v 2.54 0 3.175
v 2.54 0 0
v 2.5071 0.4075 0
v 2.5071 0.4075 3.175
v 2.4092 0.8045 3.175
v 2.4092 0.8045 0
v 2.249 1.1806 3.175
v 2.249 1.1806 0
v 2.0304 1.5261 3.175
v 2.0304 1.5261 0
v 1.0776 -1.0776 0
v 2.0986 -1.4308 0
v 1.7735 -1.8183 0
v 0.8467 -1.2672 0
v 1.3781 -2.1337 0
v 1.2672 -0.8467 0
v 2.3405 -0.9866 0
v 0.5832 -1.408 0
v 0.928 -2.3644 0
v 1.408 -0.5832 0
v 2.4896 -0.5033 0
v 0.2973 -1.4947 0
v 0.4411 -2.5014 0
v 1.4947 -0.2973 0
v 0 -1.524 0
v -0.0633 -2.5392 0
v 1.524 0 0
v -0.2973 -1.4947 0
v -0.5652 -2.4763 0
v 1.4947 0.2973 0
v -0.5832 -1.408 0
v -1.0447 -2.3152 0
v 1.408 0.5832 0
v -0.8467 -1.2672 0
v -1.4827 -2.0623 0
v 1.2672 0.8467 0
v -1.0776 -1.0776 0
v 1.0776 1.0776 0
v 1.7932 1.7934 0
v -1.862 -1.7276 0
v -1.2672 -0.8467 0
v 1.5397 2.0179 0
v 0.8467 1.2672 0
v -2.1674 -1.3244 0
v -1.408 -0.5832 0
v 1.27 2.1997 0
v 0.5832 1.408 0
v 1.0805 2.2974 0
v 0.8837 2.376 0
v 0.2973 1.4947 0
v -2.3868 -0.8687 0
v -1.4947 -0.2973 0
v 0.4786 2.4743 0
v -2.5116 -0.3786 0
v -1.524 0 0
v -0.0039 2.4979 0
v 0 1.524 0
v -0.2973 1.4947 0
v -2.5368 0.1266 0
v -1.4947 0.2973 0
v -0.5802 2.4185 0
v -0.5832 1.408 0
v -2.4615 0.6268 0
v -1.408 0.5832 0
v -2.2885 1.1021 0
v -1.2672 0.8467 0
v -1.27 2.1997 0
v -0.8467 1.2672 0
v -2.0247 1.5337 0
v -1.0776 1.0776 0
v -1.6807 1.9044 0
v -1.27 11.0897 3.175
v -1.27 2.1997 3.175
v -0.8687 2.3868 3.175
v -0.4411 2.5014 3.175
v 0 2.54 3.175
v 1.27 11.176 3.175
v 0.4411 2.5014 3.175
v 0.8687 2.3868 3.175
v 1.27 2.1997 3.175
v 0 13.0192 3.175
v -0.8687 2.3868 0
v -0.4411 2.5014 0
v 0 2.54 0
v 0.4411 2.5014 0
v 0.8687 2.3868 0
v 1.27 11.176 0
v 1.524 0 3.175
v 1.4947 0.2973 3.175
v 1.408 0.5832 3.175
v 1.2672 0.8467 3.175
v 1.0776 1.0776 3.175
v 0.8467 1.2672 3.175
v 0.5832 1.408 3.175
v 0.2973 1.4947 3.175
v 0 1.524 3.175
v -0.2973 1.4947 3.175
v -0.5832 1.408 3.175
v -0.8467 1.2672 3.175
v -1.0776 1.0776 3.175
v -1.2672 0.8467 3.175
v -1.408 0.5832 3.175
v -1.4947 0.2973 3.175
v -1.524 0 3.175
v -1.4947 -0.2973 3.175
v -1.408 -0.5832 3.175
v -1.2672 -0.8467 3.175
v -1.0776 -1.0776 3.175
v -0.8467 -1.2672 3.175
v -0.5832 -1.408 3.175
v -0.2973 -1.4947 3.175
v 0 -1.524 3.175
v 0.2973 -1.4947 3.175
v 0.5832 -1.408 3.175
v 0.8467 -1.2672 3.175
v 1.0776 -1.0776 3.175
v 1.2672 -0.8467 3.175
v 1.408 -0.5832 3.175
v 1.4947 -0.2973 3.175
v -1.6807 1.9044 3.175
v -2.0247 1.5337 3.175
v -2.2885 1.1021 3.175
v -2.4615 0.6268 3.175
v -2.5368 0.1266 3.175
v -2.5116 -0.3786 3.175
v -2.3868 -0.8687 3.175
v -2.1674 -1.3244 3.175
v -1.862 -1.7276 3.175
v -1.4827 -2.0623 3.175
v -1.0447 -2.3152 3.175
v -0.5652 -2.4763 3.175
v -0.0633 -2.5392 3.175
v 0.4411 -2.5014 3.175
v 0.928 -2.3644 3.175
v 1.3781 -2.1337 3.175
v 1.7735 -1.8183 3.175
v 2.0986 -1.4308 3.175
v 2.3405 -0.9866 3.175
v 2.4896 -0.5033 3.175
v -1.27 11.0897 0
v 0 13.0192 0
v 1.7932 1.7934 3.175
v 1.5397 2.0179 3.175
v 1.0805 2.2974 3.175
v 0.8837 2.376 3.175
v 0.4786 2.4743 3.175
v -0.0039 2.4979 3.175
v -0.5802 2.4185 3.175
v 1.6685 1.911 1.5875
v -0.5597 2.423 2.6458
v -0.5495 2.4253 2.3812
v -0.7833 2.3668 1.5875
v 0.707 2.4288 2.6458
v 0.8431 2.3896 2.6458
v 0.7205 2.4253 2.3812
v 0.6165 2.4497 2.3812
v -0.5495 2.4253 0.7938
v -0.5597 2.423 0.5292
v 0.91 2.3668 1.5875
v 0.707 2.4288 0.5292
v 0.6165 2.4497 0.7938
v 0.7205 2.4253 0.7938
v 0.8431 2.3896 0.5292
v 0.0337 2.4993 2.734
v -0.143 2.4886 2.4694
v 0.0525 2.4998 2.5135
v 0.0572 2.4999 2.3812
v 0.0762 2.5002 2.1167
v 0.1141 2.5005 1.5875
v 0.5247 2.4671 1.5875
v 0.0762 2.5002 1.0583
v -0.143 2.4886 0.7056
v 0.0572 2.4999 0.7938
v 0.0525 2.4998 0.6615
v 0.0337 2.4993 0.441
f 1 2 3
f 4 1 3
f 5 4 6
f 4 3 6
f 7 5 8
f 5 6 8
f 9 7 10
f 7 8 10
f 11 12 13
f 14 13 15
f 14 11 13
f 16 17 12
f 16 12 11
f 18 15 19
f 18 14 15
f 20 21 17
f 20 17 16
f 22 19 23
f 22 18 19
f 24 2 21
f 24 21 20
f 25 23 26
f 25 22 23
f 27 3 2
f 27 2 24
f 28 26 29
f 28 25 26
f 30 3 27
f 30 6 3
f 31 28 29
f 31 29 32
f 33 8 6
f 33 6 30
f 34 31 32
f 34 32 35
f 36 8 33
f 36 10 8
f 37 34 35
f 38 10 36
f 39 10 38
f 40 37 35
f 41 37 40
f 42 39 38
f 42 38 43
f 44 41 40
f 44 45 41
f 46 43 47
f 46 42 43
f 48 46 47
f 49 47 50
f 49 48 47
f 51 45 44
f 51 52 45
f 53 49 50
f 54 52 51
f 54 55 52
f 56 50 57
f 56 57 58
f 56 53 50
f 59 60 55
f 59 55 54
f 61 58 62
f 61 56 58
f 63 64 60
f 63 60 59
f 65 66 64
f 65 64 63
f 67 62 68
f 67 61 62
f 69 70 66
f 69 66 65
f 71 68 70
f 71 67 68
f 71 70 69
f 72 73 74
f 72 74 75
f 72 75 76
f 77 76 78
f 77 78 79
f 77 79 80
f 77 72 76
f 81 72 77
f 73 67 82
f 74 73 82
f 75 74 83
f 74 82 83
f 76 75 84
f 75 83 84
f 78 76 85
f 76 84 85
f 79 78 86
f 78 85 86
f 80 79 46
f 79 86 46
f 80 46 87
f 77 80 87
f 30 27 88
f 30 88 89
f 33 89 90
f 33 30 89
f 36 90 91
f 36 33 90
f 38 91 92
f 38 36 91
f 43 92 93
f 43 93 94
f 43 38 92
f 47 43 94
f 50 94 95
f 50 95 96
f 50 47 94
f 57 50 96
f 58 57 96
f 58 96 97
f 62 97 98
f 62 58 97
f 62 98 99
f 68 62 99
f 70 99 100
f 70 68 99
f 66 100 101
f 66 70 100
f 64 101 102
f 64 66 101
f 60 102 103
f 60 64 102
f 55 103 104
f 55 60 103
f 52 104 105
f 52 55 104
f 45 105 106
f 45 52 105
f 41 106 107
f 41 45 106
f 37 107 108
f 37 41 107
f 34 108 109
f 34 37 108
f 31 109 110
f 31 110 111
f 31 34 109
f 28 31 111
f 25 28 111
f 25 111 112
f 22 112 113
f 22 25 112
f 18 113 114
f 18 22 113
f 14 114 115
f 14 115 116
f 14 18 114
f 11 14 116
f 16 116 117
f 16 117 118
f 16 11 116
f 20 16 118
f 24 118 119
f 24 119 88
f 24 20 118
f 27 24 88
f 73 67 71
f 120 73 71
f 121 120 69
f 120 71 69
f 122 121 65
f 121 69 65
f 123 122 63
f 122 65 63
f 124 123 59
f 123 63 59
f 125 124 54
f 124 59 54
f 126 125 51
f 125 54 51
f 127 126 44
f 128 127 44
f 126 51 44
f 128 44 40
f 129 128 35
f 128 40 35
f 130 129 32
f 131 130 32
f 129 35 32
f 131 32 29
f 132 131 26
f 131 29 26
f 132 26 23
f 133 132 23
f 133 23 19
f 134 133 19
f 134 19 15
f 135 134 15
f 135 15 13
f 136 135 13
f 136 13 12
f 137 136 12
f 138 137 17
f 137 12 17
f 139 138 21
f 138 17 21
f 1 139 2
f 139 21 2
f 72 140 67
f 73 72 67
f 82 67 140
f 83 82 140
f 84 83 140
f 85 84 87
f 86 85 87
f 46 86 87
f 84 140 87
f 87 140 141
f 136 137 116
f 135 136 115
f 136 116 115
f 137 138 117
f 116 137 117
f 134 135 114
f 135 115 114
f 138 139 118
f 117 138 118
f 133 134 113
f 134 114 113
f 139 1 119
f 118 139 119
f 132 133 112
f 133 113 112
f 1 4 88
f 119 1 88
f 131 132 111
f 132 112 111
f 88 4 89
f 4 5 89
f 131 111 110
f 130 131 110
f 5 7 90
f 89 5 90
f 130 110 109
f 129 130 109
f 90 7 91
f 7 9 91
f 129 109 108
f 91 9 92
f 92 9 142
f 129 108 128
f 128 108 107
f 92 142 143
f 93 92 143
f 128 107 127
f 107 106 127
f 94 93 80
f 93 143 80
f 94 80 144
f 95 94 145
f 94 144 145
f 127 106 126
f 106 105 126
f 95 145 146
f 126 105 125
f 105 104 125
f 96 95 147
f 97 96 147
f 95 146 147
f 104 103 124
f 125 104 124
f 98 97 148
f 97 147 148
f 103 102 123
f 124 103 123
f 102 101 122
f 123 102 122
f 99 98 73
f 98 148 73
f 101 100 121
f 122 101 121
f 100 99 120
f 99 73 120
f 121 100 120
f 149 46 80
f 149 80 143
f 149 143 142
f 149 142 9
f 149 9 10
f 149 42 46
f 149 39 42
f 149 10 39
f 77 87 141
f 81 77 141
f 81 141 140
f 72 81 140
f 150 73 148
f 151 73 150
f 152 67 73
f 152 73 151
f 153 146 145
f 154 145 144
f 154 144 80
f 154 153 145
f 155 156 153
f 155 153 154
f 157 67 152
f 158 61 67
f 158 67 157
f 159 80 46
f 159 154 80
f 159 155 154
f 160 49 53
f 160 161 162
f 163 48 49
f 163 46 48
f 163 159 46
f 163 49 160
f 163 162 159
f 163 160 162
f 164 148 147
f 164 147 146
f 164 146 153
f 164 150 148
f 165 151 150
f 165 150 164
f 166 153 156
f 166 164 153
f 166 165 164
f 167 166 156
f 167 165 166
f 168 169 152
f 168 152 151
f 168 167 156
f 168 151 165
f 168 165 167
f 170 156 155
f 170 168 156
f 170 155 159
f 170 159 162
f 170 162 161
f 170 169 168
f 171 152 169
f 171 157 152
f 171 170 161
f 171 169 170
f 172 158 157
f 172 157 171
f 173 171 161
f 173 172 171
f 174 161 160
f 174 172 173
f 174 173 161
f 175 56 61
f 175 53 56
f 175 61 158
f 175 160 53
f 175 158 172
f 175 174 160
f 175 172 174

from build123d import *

# Parameters (mm, degrees)
SKETCH1_R           = 1.524
BOSS_EXTRUDE1_DEPTH = 3.175
BOSS_EXTRUDE2_DEPTH = 3.175


with BuildPart() as part:
    # Sketch1 → Boss-Extrude1 (new body)
    with BuildSketch(Plane.XY):
        with BuildLine():
            ThreePointArc((-1.27, 2.199704526), (-0.507928763, -2.488696119), (2.030417223, 1.52610809))
            add(Edge.make_bspline(
                [(2.030417223, 1.52610809), (0.827273923, 3.041818161), (-1.27, 2.199704526)],
                knots=[0.714314334, 0.714314334, 0.714314334, 1.714314334, 1.714314334, 1.714314334], degree=2))
        make_face()
        Circle(SKETCH1_R, mode=Mode.SUBTRACT)
    extrude(amount=BOSS_EXTRUDE1_DEPTH)


with BuildPart() as body_2:
    # Sketch1<4> → Boss-Extrude2 (new body)
    with BuildSketch(Plane.XY):
        with BuildLine():
            Line((-1.27, 11.089704526), (-1.27, 2.199704526))
            ThreePointArc((-1.27, 2.199704526), (0, 2.54), (1.27, 2.199704526))
            Line((1.27, 2.199704526), (1.27, 11.089704526))
            Line((1.27, 11.089704526), (1.27, 11.176))
            Line((1.27, 11.176), (0, 13.019186633))
            Line((0, 13.019186633), (-1.27, 11.089704526))
        make_face()
    extrude(amount=BOSS_EXTRUDE2_DEPTH)


solid = Compound([part.part, body_2.part])
